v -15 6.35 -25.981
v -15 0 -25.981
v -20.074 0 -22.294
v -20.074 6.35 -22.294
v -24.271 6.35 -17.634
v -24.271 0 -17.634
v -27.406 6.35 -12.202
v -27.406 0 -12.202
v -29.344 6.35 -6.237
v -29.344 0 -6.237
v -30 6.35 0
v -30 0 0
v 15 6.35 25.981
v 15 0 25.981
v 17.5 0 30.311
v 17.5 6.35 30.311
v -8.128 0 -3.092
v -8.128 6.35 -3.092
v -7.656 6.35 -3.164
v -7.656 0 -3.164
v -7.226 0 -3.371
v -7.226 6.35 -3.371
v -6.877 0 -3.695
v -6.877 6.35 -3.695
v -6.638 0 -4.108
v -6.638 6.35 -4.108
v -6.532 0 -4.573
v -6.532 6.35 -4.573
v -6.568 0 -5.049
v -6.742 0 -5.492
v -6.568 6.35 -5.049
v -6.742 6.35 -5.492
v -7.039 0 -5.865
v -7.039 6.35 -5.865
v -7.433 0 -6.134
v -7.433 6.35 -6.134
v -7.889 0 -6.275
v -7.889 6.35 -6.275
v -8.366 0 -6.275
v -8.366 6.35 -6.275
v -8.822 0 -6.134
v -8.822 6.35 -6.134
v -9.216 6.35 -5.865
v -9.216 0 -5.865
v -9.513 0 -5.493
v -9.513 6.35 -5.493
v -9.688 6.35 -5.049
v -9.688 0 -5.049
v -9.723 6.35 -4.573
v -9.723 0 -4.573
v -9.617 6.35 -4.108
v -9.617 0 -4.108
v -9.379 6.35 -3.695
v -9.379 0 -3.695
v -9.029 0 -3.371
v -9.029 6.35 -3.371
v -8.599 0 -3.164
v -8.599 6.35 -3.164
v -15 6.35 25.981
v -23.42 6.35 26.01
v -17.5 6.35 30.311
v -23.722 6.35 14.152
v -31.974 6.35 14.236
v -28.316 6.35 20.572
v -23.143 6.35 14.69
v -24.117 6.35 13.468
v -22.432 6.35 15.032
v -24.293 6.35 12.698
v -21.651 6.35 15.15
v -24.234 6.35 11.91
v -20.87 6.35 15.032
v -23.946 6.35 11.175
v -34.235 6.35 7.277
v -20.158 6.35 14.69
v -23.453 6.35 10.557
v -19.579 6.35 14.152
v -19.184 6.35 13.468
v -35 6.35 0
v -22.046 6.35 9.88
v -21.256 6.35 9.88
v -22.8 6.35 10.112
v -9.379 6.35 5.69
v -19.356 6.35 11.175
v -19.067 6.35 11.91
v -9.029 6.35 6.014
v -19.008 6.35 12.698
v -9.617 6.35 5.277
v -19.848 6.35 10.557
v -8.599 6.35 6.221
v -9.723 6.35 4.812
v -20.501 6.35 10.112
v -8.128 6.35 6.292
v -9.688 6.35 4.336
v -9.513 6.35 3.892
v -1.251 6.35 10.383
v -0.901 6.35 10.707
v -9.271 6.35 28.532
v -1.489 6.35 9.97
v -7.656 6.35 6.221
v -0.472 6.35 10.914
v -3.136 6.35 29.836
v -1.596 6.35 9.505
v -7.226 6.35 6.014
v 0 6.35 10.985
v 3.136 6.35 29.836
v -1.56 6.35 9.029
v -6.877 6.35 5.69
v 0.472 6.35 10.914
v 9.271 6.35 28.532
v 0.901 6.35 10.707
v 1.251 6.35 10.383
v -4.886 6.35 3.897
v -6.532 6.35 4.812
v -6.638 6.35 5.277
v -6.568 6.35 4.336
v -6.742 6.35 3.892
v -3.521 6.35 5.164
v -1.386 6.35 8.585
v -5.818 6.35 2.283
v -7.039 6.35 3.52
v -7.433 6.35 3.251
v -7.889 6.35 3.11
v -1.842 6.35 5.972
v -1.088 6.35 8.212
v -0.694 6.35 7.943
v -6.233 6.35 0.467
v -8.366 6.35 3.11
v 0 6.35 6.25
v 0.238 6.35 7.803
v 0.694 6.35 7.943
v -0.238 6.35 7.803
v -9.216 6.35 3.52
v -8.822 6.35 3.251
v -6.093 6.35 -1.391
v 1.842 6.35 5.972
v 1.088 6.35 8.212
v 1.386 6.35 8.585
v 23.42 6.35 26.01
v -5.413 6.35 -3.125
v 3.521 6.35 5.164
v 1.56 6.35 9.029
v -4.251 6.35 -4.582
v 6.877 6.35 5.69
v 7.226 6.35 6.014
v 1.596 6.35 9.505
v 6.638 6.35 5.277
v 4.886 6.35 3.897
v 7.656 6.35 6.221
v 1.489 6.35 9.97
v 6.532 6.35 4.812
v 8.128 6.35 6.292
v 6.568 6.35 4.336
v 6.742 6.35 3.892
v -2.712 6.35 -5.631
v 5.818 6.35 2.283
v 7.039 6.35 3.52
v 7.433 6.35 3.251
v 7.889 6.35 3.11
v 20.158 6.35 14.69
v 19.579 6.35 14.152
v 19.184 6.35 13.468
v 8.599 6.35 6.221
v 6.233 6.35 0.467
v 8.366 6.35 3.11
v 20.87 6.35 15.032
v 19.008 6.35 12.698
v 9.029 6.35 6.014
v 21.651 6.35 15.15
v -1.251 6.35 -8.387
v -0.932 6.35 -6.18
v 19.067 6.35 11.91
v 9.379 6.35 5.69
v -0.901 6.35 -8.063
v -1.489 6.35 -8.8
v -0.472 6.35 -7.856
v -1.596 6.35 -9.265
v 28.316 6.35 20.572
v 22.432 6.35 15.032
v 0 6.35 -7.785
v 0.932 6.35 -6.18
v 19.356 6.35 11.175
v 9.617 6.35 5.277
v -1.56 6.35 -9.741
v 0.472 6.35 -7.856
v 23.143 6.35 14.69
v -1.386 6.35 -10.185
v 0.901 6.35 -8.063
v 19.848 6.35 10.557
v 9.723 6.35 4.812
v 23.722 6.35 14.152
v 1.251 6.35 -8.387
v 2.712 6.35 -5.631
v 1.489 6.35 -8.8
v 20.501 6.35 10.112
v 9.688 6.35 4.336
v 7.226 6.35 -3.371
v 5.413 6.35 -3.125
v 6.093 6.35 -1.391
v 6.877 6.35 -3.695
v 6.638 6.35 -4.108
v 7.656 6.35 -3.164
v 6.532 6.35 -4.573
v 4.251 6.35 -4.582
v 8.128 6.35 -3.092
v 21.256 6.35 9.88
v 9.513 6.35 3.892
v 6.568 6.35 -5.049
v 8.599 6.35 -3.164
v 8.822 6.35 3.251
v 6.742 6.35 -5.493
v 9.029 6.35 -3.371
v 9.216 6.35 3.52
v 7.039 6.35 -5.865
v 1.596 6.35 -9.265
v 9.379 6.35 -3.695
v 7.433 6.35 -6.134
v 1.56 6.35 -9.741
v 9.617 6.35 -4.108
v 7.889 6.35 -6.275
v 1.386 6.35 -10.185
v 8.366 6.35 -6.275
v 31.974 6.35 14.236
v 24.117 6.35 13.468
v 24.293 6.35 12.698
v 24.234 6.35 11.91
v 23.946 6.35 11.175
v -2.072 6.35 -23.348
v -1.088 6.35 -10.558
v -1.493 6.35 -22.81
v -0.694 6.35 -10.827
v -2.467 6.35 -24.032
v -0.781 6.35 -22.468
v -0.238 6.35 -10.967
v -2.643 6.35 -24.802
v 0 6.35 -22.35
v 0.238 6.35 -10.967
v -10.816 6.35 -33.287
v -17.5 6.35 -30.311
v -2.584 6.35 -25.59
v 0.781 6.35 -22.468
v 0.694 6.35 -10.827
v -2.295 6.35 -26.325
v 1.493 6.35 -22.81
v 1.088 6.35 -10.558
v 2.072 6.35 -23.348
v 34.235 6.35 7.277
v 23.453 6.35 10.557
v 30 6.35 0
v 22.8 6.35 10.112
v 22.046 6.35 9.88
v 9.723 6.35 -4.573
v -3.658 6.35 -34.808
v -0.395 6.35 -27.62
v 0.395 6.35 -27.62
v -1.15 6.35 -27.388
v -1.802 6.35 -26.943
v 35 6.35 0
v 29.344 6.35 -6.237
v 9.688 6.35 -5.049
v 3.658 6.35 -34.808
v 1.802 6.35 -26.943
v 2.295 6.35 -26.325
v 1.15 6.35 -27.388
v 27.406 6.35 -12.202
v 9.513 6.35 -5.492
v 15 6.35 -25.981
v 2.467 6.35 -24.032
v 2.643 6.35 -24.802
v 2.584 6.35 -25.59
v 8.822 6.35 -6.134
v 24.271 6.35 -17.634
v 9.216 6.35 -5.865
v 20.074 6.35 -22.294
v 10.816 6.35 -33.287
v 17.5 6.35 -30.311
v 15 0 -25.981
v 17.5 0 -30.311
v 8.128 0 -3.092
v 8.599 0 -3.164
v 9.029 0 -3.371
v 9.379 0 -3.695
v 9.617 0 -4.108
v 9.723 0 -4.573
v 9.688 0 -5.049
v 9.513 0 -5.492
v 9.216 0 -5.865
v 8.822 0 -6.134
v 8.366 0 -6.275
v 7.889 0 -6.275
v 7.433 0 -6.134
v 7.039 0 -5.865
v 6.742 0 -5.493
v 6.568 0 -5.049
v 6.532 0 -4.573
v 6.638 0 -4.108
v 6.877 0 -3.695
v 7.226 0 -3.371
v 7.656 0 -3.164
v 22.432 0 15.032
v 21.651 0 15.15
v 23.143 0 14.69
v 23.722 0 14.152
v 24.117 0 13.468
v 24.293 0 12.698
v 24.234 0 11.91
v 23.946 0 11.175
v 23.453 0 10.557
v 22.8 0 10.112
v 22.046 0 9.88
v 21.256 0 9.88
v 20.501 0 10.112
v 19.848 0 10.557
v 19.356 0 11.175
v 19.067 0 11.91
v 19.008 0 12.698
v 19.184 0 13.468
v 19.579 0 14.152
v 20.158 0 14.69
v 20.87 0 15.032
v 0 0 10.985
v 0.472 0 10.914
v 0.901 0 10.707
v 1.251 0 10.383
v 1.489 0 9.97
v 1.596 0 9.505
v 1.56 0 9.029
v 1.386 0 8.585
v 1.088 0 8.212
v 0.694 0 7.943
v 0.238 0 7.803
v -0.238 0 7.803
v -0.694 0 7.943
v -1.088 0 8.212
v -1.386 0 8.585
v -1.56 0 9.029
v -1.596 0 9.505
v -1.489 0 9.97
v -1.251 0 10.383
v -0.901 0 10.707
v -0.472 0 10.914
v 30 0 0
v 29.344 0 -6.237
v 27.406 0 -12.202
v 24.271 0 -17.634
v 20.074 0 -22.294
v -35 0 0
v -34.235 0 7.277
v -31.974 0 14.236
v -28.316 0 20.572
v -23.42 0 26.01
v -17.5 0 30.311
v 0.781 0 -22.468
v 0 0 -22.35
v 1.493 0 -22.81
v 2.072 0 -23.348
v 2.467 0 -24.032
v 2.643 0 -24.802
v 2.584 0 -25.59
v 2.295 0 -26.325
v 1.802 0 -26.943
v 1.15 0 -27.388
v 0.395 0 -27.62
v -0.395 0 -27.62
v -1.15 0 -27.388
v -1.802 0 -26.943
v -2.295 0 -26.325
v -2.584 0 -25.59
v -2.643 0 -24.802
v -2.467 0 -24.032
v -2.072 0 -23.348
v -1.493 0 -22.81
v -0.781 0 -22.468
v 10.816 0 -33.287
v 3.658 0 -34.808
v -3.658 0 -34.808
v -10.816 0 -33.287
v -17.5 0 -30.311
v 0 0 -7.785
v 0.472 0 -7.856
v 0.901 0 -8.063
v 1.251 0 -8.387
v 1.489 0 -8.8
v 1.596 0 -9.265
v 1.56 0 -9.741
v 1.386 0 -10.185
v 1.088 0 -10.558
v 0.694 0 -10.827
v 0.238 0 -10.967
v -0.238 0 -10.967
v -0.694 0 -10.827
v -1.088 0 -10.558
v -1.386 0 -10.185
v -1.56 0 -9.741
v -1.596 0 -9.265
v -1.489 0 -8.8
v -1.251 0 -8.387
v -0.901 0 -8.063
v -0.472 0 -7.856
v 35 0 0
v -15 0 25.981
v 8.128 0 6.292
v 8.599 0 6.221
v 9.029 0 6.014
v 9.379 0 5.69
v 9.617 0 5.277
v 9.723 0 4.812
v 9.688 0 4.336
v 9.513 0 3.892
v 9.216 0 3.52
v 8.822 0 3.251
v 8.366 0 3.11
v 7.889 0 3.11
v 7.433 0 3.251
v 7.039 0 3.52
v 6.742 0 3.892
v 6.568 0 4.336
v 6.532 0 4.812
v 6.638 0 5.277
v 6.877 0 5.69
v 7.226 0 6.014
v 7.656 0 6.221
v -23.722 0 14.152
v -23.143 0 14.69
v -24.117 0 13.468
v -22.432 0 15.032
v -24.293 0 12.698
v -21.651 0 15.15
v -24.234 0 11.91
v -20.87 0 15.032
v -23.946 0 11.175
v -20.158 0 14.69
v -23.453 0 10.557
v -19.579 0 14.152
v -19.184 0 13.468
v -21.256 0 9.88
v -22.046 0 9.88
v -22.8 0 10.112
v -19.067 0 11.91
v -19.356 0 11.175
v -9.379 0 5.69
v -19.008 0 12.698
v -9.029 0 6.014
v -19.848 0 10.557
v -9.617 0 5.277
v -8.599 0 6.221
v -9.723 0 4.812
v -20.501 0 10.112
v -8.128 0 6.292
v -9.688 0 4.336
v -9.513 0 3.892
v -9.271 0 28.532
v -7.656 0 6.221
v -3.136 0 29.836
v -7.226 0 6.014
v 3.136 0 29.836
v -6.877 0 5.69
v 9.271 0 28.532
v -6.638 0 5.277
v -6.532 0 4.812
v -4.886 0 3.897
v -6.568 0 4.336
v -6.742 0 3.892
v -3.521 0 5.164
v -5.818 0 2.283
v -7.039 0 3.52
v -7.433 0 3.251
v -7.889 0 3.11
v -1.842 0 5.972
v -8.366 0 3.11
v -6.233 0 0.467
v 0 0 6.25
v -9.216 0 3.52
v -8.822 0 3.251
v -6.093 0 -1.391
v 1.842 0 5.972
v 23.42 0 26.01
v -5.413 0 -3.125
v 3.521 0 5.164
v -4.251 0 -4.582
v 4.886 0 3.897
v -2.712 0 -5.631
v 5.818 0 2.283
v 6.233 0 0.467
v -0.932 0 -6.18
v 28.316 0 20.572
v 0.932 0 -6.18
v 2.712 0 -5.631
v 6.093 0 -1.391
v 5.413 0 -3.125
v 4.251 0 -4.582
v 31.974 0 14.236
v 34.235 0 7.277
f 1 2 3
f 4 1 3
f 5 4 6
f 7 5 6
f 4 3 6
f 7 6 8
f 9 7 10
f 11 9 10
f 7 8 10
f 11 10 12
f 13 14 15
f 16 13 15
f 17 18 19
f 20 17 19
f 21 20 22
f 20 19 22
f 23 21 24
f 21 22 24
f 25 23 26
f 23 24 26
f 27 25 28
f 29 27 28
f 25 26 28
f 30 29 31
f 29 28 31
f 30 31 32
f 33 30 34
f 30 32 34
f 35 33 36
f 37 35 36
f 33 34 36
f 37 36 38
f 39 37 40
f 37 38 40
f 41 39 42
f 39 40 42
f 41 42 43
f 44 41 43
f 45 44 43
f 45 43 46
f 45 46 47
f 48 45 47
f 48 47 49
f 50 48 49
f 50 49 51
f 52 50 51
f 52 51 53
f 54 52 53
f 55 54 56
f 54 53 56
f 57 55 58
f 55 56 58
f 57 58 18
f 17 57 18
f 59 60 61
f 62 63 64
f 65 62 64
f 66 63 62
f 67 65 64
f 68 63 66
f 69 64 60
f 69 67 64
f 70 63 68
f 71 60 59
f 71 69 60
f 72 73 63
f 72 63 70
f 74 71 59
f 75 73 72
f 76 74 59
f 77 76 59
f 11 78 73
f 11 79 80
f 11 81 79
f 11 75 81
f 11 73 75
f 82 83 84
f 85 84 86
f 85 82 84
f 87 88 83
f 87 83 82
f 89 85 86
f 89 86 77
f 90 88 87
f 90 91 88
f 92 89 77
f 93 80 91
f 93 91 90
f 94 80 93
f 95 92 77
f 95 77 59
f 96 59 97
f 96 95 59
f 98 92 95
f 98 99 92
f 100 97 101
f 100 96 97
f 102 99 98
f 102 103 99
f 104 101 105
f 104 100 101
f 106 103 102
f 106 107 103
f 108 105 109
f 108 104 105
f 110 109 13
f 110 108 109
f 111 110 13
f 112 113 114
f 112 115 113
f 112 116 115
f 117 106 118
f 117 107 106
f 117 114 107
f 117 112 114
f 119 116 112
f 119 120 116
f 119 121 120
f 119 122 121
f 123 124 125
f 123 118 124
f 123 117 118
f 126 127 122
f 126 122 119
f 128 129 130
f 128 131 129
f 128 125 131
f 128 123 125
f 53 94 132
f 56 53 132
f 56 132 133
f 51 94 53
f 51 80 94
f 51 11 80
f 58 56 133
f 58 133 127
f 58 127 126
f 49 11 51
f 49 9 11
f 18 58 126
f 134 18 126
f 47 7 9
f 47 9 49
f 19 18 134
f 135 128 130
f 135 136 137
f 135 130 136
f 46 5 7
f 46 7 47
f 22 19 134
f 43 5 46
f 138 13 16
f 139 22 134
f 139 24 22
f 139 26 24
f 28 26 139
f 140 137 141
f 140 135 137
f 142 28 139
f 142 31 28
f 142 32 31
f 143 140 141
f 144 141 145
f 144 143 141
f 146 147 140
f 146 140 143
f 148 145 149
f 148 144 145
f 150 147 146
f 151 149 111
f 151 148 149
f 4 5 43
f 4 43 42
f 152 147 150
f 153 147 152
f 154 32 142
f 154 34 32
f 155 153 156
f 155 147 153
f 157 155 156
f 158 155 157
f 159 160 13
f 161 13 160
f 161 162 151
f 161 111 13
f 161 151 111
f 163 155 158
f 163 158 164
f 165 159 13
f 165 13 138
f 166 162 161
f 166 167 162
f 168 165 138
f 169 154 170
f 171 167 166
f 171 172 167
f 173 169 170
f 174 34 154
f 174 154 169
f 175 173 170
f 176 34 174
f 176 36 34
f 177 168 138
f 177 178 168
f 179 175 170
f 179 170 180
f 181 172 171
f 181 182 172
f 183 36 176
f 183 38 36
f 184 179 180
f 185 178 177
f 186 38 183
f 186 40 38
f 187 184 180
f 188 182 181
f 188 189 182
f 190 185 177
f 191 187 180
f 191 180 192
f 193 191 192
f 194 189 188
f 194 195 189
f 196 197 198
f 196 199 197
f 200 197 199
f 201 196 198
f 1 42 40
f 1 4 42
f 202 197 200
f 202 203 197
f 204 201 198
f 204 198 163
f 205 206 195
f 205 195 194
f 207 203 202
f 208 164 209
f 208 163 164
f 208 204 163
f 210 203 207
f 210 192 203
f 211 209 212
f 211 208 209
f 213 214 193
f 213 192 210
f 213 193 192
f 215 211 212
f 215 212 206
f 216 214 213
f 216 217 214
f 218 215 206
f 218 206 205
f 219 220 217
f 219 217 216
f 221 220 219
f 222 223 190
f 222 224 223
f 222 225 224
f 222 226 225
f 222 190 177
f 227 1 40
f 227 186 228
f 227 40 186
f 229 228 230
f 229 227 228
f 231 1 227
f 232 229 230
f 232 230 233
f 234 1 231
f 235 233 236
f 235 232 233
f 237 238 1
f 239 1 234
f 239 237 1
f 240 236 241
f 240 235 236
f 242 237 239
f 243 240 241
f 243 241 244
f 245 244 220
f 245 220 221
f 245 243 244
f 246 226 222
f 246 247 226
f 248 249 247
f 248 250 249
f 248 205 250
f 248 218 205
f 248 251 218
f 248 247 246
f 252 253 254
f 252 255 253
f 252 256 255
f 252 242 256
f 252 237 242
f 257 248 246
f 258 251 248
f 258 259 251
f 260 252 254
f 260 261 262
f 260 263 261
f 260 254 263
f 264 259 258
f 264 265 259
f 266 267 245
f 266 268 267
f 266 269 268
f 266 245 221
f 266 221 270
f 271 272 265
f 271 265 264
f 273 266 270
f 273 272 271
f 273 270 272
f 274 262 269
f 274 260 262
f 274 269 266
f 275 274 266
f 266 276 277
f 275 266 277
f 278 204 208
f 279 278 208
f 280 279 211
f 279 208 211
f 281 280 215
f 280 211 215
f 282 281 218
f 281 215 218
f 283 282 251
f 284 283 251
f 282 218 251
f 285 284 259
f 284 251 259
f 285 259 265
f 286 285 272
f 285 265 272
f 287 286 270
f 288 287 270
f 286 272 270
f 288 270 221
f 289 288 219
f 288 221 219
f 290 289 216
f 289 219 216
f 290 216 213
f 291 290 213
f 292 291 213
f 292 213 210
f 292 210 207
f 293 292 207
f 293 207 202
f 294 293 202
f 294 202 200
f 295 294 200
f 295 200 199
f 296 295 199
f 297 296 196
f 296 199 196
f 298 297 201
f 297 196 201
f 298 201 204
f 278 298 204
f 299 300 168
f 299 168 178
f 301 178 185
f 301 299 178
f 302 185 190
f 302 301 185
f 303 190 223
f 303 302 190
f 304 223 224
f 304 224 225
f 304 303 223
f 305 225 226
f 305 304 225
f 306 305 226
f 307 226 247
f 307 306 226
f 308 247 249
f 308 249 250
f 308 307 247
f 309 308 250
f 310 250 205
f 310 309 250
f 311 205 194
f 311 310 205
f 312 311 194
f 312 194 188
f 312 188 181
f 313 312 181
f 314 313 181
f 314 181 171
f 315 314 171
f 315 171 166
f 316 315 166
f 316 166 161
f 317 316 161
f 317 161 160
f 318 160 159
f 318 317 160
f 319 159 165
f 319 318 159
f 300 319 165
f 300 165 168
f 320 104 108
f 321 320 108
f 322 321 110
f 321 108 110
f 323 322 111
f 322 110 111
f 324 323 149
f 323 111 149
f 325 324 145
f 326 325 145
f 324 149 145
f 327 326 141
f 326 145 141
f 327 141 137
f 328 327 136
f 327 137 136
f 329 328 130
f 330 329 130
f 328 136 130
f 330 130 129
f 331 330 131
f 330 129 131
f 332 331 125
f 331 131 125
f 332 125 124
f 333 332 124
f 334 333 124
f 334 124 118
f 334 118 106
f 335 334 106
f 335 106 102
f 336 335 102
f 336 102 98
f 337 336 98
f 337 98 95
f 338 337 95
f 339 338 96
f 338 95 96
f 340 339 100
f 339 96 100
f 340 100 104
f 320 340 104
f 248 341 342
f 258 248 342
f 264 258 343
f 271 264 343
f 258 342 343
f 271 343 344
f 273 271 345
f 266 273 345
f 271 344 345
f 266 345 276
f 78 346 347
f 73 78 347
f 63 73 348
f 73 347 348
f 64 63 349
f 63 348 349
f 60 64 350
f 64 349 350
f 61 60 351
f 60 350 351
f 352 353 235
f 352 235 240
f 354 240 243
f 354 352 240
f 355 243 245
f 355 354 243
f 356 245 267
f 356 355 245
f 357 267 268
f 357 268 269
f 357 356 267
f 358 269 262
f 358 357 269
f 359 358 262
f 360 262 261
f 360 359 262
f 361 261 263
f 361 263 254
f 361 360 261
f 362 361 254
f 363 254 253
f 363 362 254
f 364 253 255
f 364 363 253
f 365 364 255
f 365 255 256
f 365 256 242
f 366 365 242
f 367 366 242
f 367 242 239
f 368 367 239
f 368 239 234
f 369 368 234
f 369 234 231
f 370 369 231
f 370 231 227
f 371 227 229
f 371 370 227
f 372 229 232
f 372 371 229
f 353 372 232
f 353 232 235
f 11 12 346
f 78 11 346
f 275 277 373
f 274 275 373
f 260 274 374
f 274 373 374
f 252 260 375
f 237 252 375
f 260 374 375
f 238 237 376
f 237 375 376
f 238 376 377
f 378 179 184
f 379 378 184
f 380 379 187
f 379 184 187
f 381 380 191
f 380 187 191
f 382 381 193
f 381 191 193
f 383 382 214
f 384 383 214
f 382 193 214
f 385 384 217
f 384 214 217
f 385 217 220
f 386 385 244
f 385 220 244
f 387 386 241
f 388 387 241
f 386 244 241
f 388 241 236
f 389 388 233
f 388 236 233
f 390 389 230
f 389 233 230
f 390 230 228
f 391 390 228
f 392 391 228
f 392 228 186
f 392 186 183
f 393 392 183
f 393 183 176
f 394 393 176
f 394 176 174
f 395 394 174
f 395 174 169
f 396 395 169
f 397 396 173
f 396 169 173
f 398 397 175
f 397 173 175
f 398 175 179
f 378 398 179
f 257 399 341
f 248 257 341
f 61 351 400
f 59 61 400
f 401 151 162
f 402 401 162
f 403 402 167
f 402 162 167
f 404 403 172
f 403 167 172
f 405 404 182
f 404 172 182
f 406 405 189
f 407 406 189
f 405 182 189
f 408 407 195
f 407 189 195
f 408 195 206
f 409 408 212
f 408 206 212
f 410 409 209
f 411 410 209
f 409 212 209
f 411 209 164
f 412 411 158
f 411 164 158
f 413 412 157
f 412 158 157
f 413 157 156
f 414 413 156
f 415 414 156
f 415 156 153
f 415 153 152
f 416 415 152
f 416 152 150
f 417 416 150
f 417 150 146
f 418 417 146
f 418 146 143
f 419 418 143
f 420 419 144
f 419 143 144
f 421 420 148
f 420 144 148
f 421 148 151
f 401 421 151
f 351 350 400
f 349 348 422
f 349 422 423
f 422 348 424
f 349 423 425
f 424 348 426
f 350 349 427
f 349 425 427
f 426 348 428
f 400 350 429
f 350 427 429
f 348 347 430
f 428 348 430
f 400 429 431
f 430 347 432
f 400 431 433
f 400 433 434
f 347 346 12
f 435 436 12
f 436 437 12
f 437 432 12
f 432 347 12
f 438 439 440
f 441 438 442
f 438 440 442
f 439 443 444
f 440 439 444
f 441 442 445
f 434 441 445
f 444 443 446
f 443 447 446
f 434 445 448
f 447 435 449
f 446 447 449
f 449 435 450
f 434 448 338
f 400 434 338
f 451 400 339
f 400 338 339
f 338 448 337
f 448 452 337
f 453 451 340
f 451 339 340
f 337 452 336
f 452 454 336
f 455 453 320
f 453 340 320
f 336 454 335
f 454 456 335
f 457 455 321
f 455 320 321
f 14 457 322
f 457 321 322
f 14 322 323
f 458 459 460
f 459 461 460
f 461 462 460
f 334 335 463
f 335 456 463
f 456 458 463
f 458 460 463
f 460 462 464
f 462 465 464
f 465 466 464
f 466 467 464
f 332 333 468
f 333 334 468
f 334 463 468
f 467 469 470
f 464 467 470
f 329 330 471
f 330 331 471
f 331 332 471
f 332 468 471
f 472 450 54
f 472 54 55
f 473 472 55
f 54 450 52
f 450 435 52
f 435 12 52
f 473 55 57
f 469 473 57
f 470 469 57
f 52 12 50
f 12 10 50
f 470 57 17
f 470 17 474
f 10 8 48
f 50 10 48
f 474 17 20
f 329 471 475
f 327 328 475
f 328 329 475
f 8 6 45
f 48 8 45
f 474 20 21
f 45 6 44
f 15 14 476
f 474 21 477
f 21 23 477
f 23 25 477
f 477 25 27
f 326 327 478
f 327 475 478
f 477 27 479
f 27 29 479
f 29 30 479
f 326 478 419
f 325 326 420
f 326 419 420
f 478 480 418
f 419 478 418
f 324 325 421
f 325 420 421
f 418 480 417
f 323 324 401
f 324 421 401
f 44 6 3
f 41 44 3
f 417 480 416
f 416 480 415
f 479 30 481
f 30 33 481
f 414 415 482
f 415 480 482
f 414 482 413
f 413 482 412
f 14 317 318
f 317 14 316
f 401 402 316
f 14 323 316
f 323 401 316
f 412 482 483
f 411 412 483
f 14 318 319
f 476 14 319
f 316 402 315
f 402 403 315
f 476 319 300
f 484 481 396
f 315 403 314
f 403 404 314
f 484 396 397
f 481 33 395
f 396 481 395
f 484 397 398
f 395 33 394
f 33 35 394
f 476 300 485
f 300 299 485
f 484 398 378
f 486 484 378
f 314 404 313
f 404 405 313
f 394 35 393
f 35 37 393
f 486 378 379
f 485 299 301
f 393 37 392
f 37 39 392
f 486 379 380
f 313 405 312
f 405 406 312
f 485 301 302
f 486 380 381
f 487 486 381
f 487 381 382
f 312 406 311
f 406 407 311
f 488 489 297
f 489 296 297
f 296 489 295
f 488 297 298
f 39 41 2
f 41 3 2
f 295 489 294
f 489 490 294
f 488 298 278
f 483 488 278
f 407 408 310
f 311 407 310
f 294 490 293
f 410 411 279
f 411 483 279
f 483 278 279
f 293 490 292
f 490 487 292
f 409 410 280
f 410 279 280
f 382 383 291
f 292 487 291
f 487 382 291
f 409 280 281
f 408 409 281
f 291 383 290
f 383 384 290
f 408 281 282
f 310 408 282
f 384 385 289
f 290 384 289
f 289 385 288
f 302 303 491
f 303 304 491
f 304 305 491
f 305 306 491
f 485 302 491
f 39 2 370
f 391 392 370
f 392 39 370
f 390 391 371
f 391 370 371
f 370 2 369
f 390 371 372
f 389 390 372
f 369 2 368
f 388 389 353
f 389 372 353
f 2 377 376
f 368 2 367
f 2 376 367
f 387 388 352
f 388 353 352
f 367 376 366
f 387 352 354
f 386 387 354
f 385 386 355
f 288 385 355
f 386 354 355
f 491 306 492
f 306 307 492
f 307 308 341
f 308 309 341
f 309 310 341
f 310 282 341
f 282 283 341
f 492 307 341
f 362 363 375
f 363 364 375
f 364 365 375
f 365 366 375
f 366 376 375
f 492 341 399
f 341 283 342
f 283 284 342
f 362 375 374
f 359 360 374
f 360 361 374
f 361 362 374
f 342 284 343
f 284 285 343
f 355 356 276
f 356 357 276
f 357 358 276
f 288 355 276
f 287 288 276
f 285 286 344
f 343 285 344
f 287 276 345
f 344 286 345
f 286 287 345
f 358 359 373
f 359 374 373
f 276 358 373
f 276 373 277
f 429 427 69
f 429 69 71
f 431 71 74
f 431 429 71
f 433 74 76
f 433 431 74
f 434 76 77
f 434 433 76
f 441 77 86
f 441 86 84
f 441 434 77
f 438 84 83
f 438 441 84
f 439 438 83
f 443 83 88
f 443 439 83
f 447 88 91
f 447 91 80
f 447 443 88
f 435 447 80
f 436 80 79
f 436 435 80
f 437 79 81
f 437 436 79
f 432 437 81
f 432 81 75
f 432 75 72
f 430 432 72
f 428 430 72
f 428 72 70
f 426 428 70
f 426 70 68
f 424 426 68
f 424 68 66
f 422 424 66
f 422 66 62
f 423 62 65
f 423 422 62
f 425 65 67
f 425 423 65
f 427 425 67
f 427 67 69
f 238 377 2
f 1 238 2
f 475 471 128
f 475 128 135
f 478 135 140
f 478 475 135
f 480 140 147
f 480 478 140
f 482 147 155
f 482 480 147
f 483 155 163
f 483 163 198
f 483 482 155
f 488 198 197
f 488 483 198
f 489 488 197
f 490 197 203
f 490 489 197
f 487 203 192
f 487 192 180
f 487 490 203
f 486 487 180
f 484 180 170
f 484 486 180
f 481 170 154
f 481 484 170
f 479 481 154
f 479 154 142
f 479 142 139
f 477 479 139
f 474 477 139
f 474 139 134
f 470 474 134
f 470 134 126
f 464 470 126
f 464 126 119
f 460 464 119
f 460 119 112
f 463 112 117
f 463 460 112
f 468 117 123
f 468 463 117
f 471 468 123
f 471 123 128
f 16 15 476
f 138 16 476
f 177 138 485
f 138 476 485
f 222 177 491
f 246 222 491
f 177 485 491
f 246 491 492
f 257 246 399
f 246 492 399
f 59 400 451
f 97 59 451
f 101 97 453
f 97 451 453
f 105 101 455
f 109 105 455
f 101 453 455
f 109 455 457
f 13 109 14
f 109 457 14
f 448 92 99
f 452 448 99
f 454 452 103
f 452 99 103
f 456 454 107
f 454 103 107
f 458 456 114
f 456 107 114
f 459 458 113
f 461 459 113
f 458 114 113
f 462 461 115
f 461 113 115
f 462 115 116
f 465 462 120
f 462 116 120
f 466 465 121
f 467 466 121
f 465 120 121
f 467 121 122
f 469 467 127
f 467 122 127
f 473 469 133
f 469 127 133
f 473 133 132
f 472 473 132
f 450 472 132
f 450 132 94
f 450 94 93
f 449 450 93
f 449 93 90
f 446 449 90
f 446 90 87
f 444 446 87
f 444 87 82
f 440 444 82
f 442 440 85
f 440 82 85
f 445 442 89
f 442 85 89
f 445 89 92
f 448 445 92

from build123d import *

# Parameters (mm, degrees)
BASEPLATE_SKETCH_R   = 2.65
BASEPLATE_SKETCH_R_2 = 6.25
BOSS_EXTRUDE1_DEPTH  = 6.35
SKETCH3_R            = 1.6
CUT_EXTRUDE2_DEPTH   = 6.35


with BuildPart() as part:
    # Baseplate Sketch → Boss-Extrude1 (new body)
    with BuildSketch(Plane(origin=(0, 0, 0), x_dir=(1, 0, 0), z_dir=(0, 1, 0))):
        with BuildLine():
            ThreePointArc((17.5, 30.310889132), (0, 35), (-17.5, 30.310889132))
            Line((-17.5, 30.310889132), (-15, 25.980762114))
            ThreePointArc((-15, 25.980762114), (-25.980762114, 15), (-30, 0))
            Line((-30, 0), (-35, 0))
            ThreePointArc((-35, 0), (-30.310889132, -17.5), (-17.5, -30.310889132))
            Line((-17.5, -30.310889132), (-15, -25.980762114))
            ThreePointArc((-15, -25.980762114), (0, -30), (15, -25.980762114))
            Line((15, -25.980762114), (17.5, -30.310889132))
            ThreePointArc((17.5, -30.310889132), (30.310889132, -17.5), (35, 0))
            Line((35, 0), (30, 0))
            ThreePointArc((30, 0), (25.980762114, 15), (15, 25.980762114))
            Line((15, 25.980762114), (17.5, 30.310889132))
        make_face()
        with Locations(Location((0, 25, 0), (0, 0, 270))):
            Circle(BASEPLATE_SKETCH_R, mode=Mode.SUBTRACT)
        with Locations(Location((-21.650635095, -12.5, 0), (0, 0, 270))):
            Circle(BASEPLATE_SKETCH_R, mode=Mode.SUBTRACT)
        with Locations(Location((0, 0, 0), (0, 0, 270))):
            Circle(BASEPLATE_SKETCH_R_2, mode=Mode.SUBTRACT)
        with Locations(Location((21.650635095, -12.5, 0), (0, 0, 270))):
            Circle(BASEPLATE_SKETCH_R, mode=Mode.SUBTRACT)
    extrude(amount=BOSS_EXTRUDE1_DEPTH)

    # Sketch3 → Cut-Extrude2 (cut)
    with BuildSketch(Plane(origin=(0, 6.35, 0), x_dir=(1, 0, 0), z_dir=(0, 1, 0))):
        with Locations(Location((-8.127648415, -4.6925, 0), (0, 0, 270))):
            Circle(SKETCH3_R)
        with Locations(Location((0, -9.385, 0), (0, 0, 270))):
            Circle(SKETCH3_R)
        with Locations(Location((-8.127648415, 4.6925, 0), (0, 0, 270))):
            Circle(SKETCH3_R)
        with Locations(Location((0, 9.385, 0), (0, 0, 270))):
            Circle(SKETCH3_R)
        with Locations(Location((8.127648415, 4.6925, 0), (0, 0, 270))):
            Circle(SKETCH3_R)
        with Locations(Location((8.127648415, -4.6925, 0), (0, 0, 270))):
            Circle(SKETCH3_R)
    extrude(amount=-CUT_EXTRUDE2_DEPTH, mode=Mode.SUBTRACT)


solid = part.part
